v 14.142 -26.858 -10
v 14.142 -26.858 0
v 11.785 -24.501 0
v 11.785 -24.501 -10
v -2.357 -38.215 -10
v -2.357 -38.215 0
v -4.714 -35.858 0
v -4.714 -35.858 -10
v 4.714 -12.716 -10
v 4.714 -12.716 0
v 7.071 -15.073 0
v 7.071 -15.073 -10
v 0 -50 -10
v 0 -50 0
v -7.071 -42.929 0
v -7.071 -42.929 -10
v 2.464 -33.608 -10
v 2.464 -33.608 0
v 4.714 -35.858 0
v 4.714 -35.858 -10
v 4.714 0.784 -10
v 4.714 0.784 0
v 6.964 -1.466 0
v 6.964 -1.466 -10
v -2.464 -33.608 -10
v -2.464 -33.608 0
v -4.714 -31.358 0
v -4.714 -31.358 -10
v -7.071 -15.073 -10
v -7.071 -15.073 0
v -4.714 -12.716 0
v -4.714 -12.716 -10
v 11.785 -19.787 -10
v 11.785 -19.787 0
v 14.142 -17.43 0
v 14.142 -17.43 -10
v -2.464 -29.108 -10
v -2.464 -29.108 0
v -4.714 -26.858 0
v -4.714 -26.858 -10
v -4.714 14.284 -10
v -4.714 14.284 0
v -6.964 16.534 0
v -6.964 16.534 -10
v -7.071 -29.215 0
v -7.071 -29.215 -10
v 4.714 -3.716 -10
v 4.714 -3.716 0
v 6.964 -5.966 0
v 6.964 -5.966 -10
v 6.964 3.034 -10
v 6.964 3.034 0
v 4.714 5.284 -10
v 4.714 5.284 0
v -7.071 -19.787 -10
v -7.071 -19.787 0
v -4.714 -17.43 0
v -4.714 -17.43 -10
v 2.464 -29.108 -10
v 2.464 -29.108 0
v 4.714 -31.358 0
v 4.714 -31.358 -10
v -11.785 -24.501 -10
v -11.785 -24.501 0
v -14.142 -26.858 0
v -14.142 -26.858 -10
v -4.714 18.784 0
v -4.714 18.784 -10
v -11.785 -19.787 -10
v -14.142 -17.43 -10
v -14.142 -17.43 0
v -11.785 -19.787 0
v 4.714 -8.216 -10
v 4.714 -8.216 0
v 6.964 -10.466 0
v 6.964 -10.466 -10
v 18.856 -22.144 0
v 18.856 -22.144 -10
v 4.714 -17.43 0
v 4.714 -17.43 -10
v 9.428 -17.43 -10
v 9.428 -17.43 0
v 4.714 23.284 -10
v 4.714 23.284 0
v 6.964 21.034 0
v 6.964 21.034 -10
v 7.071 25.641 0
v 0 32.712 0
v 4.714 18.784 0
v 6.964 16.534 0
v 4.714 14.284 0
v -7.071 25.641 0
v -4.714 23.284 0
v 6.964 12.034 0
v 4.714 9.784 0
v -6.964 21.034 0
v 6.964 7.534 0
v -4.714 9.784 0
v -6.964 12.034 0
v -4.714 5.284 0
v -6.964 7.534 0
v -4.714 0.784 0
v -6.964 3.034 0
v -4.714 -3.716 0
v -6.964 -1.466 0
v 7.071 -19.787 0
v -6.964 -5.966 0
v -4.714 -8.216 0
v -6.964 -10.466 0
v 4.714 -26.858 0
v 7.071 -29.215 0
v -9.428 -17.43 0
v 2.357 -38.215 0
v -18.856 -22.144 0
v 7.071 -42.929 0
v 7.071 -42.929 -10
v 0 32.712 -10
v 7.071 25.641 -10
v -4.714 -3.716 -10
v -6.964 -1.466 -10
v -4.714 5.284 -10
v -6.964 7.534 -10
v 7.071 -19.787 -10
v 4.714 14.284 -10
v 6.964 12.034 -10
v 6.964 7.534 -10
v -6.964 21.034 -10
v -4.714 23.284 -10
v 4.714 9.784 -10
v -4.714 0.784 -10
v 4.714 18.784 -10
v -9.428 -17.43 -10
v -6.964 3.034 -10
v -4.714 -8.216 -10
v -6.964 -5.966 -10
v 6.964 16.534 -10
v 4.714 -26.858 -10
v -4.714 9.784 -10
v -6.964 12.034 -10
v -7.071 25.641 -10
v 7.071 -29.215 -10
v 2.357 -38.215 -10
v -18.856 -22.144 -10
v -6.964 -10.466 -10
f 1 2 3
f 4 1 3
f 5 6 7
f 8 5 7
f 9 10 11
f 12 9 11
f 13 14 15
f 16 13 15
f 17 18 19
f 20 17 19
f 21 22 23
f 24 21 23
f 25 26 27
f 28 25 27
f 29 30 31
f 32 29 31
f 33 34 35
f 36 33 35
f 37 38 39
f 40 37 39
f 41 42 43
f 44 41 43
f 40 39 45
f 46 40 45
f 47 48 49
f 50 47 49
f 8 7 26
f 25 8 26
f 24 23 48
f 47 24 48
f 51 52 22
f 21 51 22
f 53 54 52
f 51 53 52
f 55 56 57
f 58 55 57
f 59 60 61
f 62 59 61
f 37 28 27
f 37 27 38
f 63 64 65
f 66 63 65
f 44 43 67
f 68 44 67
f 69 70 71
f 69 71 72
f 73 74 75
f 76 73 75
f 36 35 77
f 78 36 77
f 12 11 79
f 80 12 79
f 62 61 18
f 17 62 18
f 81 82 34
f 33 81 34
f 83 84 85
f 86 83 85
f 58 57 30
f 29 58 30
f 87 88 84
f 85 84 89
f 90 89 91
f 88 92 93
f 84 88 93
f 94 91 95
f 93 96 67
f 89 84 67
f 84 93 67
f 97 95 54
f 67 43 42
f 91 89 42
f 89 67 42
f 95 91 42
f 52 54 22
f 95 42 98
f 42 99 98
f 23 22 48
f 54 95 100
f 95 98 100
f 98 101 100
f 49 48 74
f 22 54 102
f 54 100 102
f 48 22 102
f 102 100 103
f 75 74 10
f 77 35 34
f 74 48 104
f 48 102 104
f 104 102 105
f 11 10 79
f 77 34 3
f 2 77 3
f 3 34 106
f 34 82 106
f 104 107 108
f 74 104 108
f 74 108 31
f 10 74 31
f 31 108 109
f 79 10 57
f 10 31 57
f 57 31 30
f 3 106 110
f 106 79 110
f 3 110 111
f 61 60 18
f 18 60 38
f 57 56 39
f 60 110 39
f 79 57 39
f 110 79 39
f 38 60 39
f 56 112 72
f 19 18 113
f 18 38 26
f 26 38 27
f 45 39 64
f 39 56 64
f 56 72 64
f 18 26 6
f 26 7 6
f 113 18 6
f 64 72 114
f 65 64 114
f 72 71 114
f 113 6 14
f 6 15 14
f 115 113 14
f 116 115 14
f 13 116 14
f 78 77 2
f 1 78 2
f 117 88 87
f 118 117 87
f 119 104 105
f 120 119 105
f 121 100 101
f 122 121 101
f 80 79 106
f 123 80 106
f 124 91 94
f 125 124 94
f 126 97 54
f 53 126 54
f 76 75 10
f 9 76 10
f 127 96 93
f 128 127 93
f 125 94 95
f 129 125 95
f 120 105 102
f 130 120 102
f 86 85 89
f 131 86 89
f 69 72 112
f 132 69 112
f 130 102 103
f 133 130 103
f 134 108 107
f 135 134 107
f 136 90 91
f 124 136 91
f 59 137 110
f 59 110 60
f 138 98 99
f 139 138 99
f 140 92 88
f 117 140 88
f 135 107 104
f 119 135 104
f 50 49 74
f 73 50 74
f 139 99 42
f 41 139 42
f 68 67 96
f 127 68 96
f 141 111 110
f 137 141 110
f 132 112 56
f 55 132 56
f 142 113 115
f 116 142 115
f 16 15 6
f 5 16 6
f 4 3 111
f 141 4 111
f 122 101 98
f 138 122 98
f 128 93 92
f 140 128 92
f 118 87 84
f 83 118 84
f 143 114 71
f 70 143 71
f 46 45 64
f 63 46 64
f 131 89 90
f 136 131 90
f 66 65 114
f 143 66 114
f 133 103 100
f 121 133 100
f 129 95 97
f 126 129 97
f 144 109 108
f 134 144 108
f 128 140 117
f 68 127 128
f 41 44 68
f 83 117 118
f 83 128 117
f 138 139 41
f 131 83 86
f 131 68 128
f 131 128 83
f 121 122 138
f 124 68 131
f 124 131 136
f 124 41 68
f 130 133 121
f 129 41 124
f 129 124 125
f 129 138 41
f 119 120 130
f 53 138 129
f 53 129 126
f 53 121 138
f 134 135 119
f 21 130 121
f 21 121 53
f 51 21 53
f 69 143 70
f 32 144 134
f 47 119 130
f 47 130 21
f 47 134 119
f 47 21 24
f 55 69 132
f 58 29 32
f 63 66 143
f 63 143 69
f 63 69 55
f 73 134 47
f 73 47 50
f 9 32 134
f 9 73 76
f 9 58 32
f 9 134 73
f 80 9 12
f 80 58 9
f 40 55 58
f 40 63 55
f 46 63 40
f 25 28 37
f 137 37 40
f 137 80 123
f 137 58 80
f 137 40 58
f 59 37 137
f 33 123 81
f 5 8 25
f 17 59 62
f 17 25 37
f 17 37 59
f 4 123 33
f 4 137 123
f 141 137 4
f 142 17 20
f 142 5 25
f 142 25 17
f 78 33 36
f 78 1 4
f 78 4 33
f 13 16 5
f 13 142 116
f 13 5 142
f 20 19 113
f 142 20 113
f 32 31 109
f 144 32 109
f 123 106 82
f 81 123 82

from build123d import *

# Parameters (mm, degrees)
F0_W     = 40
F0_H     = 100
F1_DEPTH = 15
F3_DEPTH = 10
F4_W     = 100
F4_H     = 15
F5_DEPTH = 100


with BuildPart() as f1:
    # F0 (on Top) → F1 (new body)
    with BuildSketch(Plane.XY):
        Rectangle(F0_W, F0_H)
    extrude(amount=F1_DEPTH)

    # F2 (on face) → F3 (join)
    with BuildSketch(Plane(origin=(0, 0, 0), x_dir=(1, 0, 0), z_dir=(0, 0, -1))):
        Polygon((7.071068, 42.928932), (0, 50), (-7.071068, 42.928932), (-2.357023, 38.214887), (-4.714045, 35.857864), (-2.464045, 33.607864), (-4.714045, 31.357864), (-2.464045, 29.107864), (-4.714045, 26.857864), (-7.071068, 29.214887), (-11.785113, 24.500842), (-14.142136, 26.857864), (-18.856181, 22.143819), (-14.142136, 17.429774), (-11.785113, 19.786797), (-9.42809, 17.429774), (-7.071068, 19.786797), (-4.714045, 17.429774), (-7.071068, 15.072751), (-4.714045, 12.715729), (-6.964045, 10.465729), (-4.714045, 8.215729), (-6.964045, 5.965729), (-4.714045, 3.715729), (-6.964045, 1.465729), (-4.714045, -0.784271), (-6.964045, -3.034271), (-4.714045, -5.284271), (-6.964045, -7.534271), (-4.714045, -9.784271), (-6.964045, -12.034271), (-4.714045, -14.284271), (-6.964045, -16.534271), (-4.714045, -18.784271), (-6.964045, -21.034271), (-4.714045, -23.284271), (-7.071068, -25.641294), (0, -32.712362), (7.071068, -25.641294), (4.714045, -23.284271), (6.964045, -21.034271), (4.714045, -18.784271), (6.964045, -16.534271), (4.714045, -14.284271), (6.964045, -12.034271), (4.714045, -9.784271), (6.964045, -7.534271), (4.714045, -5.284271), (6.964045, -3.034271), (4.714045, -0.784271), (6.964045, 1.465729), (4.714045, 3.715729), (6.964045, 5.965729), (4.714045, 8.215729), (6.964045, 10.465729), (4.714045, 12.715729), (7.071068, 15.072751), (4.714045, 17.429774), (7.071068, 19.786797), (9.42809, 17.429774), (11.785113, 19.786797), (14.142136, 17.429774), (18.856181, 22.143819), (14.142136, 26.857864), (11.785113, 24.500842), (7.071068, 29.214887), (4.714045, 26.857864), (2.464045, 29.107864), (4.714045, 31.357864), (2.464045, 33.607864), (4.714045, 35.857864), (2.357023, 38.214887), align=None)
    extrude(amount=F3_DEPTH)

    # F4 (on face) → F5 (cut)
    with BuildSketch(Plane(origin=(-20, 0, 0), x_dir=(0, -1, 0), z_dir=(-1, 0, 0))):
        with Locations((0, 7.5)):
            Rectangle(F4_W, F4_H)
    extrude(amount=-F5_DEPTH, mode=Mode.SUBTRACT)


solid = f1.part
